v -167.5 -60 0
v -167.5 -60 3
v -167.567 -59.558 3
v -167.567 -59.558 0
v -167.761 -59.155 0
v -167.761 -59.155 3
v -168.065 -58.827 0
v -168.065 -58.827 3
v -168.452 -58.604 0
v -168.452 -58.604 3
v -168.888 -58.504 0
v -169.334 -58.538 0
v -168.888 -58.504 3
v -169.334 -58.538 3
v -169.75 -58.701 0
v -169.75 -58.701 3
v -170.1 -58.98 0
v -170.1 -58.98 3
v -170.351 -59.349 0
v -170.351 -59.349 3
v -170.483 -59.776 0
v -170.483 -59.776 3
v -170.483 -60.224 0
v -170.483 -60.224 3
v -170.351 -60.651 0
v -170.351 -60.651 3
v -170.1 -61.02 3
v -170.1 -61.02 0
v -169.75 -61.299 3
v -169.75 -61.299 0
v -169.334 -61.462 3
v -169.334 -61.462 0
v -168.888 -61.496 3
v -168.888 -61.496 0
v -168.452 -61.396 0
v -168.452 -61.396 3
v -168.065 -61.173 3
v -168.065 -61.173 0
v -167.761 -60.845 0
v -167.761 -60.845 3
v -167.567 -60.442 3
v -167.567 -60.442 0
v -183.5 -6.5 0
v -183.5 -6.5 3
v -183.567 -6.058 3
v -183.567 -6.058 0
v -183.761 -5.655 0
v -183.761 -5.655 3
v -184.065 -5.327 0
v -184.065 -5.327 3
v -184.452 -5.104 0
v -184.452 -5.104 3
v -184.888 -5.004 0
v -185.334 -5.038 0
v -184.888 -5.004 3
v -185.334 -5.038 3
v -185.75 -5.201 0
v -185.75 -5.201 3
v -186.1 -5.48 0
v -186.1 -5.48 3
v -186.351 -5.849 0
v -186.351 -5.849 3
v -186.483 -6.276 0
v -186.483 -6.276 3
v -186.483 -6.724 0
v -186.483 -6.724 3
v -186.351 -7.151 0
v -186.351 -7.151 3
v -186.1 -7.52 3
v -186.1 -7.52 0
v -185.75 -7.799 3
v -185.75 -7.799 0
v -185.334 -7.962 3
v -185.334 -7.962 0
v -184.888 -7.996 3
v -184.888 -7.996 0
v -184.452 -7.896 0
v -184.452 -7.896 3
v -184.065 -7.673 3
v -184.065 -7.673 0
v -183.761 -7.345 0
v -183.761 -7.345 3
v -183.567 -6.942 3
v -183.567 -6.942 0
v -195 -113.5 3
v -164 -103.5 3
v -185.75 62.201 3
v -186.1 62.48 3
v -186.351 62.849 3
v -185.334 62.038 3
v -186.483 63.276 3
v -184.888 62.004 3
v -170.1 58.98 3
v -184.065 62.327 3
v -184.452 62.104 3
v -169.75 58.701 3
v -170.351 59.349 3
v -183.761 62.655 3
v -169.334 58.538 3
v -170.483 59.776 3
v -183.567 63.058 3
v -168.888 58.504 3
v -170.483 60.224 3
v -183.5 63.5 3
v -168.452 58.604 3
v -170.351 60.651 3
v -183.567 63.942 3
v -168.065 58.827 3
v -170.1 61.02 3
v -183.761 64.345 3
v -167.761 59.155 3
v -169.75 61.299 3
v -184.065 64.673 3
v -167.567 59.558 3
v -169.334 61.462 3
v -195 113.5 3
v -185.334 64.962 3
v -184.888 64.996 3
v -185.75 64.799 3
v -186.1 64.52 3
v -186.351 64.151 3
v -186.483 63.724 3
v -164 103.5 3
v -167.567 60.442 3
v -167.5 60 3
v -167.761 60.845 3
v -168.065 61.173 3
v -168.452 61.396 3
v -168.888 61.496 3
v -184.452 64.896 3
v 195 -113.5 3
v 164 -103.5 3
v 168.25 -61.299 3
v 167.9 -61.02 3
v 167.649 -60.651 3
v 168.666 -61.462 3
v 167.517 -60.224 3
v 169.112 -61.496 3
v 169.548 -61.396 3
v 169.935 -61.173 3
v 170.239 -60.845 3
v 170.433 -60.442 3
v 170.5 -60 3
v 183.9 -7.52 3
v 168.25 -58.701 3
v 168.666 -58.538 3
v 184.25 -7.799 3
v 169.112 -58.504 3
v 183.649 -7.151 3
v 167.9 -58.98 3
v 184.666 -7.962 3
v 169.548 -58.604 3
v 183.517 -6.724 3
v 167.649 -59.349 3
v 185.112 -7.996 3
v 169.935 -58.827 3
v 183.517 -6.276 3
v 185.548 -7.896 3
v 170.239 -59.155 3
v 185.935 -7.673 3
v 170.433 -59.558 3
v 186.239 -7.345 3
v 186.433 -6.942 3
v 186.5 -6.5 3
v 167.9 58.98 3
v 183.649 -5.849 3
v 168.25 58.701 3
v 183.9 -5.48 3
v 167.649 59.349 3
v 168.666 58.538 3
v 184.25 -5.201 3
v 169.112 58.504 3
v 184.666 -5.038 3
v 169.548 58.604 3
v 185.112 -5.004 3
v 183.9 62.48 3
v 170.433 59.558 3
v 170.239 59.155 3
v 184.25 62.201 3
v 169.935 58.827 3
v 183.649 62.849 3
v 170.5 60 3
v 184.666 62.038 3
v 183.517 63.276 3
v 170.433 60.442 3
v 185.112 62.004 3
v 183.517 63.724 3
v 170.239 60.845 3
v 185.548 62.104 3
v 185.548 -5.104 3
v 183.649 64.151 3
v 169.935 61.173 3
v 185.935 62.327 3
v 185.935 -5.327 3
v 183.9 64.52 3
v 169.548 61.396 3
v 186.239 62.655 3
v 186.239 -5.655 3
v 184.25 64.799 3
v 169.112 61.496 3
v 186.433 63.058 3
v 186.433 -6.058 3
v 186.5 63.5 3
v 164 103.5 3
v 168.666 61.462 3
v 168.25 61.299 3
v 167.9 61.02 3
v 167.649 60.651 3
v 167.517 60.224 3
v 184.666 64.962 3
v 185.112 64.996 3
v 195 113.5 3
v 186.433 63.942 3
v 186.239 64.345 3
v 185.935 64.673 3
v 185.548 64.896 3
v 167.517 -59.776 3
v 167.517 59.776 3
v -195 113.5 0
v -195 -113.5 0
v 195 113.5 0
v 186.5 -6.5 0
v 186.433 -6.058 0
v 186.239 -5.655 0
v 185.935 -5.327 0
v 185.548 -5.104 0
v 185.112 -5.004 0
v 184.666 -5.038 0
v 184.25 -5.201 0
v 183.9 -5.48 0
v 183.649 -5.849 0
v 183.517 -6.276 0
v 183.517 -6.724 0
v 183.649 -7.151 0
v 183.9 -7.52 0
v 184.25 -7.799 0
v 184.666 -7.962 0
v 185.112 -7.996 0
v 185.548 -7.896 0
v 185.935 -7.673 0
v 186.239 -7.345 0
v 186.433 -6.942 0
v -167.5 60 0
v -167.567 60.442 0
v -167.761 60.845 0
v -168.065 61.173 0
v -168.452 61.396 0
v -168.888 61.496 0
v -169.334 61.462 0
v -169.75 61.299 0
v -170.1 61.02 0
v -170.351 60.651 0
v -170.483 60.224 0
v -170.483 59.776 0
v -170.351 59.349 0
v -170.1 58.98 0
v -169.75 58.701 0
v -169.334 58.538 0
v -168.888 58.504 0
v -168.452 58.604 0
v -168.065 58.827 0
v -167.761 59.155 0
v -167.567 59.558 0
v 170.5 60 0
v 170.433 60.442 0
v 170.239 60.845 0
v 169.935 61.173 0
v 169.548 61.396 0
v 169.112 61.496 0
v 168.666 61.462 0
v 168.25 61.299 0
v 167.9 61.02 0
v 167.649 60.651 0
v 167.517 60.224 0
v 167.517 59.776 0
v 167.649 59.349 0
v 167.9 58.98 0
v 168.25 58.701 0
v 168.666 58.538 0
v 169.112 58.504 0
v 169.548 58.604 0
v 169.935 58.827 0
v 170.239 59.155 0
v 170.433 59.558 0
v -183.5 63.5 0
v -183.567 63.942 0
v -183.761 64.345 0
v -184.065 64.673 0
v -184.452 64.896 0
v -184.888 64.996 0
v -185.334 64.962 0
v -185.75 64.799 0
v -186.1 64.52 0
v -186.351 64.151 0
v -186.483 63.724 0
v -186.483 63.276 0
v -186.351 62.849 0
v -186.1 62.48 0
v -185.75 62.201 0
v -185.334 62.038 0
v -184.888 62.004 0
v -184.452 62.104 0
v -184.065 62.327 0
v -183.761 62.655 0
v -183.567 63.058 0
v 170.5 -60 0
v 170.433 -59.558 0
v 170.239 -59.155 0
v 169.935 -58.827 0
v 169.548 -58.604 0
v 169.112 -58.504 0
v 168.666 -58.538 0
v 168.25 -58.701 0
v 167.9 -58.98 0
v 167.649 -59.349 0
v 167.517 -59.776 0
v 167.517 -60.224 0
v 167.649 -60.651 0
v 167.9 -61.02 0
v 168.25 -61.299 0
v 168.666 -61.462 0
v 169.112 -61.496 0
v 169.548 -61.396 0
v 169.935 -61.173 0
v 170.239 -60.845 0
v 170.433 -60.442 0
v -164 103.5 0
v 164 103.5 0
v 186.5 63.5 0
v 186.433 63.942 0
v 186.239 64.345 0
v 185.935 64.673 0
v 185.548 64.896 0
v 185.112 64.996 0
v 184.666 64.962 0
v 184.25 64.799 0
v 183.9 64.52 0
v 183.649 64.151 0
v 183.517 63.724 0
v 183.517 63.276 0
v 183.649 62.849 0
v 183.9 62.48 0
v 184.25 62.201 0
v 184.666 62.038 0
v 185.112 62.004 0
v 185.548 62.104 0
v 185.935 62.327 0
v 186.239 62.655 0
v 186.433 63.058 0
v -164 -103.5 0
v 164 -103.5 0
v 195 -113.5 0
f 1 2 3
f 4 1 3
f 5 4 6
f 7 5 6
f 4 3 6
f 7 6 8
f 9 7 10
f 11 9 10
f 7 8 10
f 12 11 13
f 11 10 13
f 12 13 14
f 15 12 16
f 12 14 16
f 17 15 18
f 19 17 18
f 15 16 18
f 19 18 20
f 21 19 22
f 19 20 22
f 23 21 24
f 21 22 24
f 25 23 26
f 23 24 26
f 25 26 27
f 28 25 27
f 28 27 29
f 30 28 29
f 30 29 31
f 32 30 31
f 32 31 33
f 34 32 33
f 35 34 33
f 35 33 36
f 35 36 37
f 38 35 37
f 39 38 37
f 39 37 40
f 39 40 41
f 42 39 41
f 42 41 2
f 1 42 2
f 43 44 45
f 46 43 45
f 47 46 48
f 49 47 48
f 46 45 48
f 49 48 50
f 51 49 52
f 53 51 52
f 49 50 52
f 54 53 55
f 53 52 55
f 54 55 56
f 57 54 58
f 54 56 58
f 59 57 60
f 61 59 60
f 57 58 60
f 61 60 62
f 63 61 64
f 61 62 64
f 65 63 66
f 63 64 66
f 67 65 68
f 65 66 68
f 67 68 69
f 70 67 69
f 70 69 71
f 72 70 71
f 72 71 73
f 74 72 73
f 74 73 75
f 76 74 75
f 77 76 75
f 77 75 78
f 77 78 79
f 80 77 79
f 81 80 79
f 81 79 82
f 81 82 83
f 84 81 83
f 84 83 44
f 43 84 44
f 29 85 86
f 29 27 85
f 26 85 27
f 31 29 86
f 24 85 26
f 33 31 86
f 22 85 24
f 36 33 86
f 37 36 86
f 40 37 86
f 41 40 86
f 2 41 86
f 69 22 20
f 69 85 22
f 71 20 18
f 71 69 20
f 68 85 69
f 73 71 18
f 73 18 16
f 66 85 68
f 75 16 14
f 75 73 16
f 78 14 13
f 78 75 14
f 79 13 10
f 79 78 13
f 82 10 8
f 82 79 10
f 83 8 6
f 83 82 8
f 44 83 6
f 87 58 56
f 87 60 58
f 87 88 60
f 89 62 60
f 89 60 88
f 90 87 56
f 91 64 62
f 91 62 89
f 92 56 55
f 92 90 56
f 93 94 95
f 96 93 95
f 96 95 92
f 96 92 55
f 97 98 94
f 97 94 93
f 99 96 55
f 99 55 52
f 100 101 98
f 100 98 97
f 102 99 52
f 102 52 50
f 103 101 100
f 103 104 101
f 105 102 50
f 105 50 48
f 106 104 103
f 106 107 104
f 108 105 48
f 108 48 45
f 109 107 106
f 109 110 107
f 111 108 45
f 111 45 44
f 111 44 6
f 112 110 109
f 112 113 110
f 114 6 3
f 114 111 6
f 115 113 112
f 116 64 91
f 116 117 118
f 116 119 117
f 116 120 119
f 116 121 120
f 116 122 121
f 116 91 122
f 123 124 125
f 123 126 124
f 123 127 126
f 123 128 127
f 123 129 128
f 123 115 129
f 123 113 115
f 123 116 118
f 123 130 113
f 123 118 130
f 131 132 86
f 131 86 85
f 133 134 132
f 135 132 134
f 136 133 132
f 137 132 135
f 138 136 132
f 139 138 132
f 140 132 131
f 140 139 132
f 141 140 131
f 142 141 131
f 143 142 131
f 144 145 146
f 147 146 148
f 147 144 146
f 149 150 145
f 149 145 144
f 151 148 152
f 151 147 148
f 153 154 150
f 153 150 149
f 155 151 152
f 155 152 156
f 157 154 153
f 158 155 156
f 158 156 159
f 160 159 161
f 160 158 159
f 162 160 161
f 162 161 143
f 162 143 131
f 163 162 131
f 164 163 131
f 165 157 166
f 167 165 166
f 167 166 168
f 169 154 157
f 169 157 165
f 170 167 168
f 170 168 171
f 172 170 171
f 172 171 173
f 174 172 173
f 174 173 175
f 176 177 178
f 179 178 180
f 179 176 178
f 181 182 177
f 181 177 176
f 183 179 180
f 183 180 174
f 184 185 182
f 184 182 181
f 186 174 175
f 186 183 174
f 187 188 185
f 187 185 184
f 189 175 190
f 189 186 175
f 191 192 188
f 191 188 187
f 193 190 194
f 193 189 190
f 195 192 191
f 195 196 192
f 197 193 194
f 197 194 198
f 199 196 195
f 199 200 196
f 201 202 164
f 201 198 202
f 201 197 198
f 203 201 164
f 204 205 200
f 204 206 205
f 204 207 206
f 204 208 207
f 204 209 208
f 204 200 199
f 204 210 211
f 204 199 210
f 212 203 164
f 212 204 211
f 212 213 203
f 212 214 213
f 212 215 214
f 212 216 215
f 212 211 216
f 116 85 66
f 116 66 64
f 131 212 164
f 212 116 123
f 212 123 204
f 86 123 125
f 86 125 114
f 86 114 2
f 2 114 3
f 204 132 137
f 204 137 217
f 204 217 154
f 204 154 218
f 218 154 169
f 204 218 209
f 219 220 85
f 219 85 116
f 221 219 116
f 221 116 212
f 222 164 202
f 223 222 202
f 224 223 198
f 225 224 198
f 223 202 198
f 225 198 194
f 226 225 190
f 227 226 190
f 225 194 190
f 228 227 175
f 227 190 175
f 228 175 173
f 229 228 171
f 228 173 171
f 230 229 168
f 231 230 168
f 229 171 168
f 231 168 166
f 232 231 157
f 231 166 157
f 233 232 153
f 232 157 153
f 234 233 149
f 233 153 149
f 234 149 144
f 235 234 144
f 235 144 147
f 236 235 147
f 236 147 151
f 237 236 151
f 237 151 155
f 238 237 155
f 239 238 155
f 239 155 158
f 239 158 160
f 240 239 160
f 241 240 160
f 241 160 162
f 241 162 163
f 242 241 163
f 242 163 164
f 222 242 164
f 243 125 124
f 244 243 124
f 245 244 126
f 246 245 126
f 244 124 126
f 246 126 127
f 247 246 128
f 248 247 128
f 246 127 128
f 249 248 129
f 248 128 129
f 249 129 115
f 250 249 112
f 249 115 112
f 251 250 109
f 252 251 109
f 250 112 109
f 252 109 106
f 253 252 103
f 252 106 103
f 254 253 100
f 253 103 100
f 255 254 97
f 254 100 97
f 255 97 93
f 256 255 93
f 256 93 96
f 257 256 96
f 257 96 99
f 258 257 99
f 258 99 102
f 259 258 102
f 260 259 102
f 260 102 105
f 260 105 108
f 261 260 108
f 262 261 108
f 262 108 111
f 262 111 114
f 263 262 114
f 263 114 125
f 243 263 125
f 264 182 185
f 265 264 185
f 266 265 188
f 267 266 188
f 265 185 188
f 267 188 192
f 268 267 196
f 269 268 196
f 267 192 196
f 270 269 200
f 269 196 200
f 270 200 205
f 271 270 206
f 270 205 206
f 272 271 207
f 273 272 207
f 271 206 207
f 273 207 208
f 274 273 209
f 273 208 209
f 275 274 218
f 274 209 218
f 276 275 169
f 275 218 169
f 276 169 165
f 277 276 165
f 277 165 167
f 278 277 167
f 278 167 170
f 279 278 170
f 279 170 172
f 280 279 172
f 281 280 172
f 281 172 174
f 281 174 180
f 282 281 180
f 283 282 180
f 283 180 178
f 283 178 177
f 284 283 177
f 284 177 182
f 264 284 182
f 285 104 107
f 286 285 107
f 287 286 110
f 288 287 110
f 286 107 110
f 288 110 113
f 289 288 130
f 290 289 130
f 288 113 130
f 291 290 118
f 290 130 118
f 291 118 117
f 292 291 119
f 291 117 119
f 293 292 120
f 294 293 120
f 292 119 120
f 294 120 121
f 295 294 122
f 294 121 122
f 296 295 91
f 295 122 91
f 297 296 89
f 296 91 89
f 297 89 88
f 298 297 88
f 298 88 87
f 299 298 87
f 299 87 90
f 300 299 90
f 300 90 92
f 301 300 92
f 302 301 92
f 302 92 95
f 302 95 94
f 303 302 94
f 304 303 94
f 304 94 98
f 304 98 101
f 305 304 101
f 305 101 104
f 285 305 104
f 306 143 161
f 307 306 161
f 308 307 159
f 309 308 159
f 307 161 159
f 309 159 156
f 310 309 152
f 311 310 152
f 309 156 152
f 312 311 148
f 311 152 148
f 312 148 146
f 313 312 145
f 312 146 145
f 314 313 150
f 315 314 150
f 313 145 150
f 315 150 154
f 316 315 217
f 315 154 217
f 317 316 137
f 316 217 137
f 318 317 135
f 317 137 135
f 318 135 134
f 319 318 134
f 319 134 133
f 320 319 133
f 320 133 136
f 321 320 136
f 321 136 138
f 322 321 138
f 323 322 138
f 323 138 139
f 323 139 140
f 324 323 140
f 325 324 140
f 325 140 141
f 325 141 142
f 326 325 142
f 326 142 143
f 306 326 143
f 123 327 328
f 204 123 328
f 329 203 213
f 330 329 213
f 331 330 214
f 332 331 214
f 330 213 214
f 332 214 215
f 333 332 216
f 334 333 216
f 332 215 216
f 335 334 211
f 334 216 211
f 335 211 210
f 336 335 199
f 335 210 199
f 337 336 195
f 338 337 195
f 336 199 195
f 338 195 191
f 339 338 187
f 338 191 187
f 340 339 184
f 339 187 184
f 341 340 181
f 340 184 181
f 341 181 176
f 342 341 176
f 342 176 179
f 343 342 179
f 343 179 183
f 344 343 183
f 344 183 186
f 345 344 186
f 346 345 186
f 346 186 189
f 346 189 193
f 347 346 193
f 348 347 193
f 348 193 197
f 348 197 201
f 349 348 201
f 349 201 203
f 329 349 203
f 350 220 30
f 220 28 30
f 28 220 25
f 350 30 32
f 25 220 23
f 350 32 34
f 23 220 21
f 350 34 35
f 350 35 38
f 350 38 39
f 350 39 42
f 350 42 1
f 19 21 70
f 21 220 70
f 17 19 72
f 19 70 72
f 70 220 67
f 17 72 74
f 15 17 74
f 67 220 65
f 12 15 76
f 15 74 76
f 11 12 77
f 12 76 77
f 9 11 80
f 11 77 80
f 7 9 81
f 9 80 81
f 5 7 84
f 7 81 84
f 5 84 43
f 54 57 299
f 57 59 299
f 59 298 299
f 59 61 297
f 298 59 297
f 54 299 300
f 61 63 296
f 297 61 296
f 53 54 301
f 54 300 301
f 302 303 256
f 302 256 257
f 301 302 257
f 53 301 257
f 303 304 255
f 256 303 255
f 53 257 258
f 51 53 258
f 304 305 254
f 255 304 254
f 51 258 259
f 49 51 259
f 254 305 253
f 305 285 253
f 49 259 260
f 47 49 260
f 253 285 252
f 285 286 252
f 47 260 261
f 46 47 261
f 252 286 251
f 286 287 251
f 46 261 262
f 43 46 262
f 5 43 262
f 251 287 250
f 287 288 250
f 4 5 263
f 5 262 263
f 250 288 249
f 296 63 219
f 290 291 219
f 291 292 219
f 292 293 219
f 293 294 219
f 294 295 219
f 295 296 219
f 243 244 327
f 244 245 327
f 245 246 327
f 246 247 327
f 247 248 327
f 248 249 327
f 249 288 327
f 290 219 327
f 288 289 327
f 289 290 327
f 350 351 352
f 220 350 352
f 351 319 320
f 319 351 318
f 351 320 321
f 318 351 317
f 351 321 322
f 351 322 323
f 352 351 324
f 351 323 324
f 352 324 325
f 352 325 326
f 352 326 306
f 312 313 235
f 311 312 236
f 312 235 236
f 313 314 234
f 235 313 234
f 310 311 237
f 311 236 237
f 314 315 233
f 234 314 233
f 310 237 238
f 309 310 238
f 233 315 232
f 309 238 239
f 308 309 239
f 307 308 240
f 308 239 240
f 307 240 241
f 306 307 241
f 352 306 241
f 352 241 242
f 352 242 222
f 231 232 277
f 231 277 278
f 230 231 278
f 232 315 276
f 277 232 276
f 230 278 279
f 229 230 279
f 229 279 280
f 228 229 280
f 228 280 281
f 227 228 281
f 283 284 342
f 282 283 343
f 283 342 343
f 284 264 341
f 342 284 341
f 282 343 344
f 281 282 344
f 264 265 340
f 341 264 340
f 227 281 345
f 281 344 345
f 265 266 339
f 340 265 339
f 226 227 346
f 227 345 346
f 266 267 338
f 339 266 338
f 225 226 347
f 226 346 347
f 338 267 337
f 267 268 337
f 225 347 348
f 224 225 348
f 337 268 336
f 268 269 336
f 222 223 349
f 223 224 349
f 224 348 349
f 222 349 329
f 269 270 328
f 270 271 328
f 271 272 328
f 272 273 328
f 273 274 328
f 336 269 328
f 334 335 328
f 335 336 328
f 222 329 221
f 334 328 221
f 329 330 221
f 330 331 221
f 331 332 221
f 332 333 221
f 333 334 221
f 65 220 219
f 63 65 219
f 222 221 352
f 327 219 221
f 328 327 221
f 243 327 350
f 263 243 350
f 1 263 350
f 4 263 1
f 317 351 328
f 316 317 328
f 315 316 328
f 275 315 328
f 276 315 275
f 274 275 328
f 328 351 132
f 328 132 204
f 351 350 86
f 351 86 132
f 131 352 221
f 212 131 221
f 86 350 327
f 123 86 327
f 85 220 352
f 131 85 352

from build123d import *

# Parameters (mm, degrees)
SKETCH1_W           = 390
SKETCH1_H           = 227
SKETCH1_W_2         = 328
SKETCH1_H_2         = 207
BOSS_EXTRUDE1_DEPTH = 3
SKETCH2_R           = 1.5
CUT_EXTRUDE1_DEPTH  = 4
SKETCH3_R           = 1.5
CUT_EXTRUDE2_DEPTH  = 4


with BuildPart() as part:
    # Sketch1 → Boss-Extrude1 (new body)
    with BuildSketch(Plane.XY):
        Rectangle(SKETCH1_W, SKETCH1_H)
        Rectangle(SKETCH1_W_2, SKETCH1_H_2, mode=Mode.SUBTRACT)
    extrude(amount=BOSS_EXTRUDE1_DEPTH)

    # Sketch2 → Cut-Extrude1 (cut, through all)
    with BuildSketch(Plane.XY.offset(3)):
        with Locations((-185, 63.5)):
            Circle(SKETCH2_R)
        with Locations((-185, -6.5)):
            Circle(SKETCH2_R)
        with Locations((185, -6.5)):
            Circle(SKETCH2_R)
        with Locations((185, 63.5)):
            Circle(SKETCH2_R)
    extrude(amount=-CUT_EXTRUDE1_DEPTH, mode=Mode.SUBTRACT)

    # Sketch3 → Cut-Extrude2 (cut, through all)
    with BuildSketch(Plane.XY.offset(3)):
        with Locations((-169, 60)):
            Circle(SKETCH3_R)
        with Locations((-169, -60)):
            Circle(SKETCH3_R)
        with Locations((169, -60)):
            Circle(SKETCH3_R)
        with Locations((169, 60)):
            Circle(SKETCH3_R)
    extrude(amount=-CUT_EXTRUDE2_DEPTH, mode=Mode.SUBTRACT)


solid = part.part
